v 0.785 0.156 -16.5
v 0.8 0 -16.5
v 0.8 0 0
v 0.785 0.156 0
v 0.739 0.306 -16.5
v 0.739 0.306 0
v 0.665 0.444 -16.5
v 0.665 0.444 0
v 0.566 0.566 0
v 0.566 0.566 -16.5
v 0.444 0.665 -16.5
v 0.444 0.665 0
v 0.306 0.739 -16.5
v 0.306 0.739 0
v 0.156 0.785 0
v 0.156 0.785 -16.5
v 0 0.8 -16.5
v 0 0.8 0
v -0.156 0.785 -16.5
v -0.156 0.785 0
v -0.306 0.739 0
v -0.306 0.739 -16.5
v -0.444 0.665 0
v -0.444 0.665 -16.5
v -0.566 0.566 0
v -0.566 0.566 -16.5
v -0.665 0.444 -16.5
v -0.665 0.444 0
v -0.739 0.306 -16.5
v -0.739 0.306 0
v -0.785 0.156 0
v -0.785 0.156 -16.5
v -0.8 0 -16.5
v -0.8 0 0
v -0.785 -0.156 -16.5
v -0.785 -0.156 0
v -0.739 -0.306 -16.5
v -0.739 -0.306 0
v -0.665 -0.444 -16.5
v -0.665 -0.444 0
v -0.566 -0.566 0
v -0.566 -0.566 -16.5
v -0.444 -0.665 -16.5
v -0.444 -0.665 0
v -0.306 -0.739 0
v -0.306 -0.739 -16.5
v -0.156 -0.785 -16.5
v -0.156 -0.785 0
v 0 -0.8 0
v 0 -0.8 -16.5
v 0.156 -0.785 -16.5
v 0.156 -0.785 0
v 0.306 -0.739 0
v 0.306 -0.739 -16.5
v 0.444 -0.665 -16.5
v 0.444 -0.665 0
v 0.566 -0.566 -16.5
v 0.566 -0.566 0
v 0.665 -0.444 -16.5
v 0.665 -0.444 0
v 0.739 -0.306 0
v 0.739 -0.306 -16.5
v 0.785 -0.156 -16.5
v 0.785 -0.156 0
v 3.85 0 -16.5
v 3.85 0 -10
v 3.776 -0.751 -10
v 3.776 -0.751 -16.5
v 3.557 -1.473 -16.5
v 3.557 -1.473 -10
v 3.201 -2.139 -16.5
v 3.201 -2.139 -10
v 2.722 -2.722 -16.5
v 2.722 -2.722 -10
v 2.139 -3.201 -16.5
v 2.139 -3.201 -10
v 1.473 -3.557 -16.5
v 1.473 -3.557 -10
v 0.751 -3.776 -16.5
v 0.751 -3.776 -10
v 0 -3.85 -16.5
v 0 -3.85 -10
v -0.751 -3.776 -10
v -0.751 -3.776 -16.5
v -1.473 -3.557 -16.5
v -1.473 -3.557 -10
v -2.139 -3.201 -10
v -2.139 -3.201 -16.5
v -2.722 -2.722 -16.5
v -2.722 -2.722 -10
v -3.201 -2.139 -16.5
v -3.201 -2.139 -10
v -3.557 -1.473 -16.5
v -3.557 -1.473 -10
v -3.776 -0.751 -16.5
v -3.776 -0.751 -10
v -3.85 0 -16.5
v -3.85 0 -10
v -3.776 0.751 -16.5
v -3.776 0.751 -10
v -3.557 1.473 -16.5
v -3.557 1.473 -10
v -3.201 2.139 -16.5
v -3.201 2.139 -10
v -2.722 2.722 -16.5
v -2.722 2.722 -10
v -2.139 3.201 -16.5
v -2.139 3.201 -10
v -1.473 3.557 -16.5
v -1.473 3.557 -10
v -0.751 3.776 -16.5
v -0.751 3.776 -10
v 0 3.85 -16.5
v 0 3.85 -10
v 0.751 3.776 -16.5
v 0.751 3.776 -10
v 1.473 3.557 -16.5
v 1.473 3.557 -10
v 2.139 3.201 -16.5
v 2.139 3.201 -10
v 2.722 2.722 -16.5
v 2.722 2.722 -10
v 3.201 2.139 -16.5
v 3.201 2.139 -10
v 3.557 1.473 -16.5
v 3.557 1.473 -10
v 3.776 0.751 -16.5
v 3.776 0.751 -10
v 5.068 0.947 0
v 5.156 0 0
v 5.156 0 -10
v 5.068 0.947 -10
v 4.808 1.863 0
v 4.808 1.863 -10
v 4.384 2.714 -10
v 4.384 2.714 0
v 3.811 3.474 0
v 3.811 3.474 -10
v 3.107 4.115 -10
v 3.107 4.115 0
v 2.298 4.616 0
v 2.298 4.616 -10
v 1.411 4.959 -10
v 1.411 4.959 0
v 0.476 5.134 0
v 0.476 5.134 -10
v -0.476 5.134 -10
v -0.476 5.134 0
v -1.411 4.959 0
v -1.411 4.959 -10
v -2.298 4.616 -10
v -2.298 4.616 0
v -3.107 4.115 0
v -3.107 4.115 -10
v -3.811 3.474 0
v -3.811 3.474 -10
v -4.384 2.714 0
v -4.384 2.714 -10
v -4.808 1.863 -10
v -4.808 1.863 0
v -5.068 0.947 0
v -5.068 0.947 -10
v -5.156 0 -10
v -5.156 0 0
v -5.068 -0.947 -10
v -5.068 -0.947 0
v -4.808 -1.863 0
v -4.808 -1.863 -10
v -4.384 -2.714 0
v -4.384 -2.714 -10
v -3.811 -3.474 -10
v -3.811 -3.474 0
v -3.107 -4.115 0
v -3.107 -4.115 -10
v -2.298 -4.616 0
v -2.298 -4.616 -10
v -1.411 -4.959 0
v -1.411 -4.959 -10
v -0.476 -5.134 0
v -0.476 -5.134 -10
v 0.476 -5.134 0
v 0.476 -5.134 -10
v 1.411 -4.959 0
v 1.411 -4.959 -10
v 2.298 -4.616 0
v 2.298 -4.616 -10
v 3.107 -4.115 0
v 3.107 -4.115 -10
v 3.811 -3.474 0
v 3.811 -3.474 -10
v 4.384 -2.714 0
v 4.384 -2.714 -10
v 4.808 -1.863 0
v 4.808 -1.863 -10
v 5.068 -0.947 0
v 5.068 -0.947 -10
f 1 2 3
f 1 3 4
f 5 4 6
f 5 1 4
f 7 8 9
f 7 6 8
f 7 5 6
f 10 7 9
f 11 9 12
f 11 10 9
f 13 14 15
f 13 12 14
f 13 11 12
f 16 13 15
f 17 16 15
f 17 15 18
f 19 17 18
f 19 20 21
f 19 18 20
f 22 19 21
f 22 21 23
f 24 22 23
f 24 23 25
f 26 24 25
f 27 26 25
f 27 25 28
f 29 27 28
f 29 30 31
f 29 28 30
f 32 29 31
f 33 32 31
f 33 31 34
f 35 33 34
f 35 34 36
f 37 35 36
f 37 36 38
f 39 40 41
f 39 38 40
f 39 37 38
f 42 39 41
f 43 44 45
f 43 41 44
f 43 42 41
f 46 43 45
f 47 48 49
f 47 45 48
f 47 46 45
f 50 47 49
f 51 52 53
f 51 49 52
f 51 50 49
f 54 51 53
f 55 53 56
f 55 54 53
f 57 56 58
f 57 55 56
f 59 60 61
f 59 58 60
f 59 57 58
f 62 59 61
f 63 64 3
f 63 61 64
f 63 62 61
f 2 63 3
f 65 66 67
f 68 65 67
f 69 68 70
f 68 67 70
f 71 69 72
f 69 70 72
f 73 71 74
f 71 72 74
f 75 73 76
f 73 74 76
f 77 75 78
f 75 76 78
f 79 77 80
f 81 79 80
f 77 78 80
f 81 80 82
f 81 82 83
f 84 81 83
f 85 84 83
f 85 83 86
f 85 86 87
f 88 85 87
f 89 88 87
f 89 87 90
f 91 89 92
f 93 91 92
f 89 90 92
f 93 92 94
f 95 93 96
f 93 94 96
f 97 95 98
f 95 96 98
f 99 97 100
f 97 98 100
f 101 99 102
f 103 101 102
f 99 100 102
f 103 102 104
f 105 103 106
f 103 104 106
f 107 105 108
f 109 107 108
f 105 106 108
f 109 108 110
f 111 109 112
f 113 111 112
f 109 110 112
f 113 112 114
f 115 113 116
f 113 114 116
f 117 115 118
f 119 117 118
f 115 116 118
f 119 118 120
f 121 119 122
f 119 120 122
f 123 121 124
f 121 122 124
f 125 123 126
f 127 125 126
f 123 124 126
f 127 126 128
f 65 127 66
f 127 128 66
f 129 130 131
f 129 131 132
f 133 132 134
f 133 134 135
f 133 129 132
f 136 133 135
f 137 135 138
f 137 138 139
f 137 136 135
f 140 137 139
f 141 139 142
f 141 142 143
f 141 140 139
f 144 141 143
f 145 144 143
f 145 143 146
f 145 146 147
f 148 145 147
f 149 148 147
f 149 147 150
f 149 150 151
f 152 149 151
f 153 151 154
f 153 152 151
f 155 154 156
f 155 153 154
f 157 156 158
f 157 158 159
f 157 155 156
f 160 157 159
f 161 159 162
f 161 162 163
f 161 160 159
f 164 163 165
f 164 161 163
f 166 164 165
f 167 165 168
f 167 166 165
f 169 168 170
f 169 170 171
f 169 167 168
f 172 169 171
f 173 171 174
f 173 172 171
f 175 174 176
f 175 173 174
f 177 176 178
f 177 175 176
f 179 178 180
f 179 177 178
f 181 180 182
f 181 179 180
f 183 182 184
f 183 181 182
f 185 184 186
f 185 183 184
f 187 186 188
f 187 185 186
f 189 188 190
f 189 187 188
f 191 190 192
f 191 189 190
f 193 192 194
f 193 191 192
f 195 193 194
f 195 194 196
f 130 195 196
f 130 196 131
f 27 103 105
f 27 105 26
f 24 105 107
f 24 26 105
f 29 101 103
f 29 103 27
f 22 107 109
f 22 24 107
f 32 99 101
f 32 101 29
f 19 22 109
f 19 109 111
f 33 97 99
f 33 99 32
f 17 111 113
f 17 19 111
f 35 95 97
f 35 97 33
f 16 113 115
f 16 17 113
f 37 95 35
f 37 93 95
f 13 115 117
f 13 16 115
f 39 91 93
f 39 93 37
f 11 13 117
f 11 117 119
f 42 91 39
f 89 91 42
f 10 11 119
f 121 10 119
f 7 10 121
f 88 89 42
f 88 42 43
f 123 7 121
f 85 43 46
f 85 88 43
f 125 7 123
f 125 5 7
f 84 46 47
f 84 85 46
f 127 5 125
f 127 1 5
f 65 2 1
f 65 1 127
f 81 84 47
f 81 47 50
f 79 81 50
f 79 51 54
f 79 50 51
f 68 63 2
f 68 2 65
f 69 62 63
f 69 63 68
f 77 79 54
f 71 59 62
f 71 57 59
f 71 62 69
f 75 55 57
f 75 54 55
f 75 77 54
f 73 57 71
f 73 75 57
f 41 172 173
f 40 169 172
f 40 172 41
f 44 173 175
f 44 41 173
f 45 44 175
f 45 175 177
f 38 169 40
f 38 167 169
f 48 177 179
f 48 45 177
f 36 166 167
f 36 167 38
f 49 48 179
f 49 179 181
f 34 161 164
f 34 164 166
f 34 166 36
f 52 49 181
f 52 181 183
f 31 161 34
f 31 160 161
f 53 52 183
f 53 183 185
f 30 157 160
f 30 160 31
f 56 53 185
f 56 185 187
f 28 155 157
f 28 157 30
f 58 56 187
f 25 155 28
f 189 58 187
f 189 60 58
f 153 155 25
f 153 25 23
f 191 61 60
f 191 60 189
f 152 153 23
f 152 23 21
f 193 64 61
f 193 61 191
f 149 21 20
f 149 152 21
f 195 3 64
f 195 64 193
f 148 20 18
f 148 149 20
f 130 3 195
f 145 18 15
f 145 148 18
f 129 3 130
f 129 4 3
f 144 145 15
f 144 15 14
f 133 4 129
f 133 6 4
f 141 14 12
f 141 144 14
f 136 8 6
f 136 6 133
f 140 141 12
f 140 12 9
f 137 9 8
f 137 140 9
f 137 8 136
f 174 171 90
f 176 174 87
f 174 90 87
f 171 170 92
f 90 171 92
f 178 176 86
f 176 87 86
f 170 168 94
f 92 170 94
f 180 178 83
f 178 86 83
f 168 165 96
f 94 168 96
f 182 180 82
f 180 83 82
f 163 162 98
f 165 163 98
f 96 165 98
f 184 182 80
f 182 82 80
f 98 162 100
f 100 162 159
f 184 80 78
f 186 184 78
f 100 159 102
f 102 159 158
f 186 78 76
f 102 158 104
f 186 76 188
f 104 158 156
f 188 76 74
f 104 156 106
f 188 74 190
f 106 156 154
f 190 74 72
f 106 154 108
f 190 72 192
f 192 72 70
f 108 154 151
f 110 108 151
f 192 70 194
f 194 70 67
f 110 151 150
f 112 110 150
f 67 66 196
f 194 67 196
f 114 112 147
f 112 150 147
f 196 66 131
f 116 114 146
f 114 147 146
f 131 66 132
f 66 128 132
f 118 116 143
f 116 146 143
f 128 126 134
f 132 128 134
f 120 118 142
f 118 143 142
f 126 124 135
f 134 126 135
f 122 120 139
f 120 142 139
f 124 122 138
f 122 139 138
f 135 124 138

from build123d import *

# Parameters (mm, degrees)
SKETCH2_R               = 5.156250121
BOSS_EXTRUDE1_DEPTH     = 10
SKETCH3_R               = 3.85
BOSS_EXTRUDE2_DEPTH     = 6.5
CUT_EXTRUDE1_DEPTH      = 19.039507494
CUT_EXTRUDE1_DEPTH_BACK = 19.039507494
SKETCH5_R               = 0.8


with BuildPart() as part:
    # Sketch2 → Boss-Extrude1 (new body)
    with BuildSketch(Plane.XY):
        Circle(SKETCH2_R)
    extrude(amount=-BOSS_EXTRUDE1_DEPTH)

    # Sketch3 → Boss-Extrude2 (add)
    with BuildSketch(Plane(origin=(0, 0, -10), x_dir=(-1, 0, 0), z_dir=(0, 0, -1))):
        with Locations(Location((0, 0, 0), (0, 0, 180))):
            Circle(SKETCH3_R)
    extrude(amount=BOSS_EXTRUDE2_DEPTH)

    # Sketch5 → Cut-Extrude1 (cut, two sides: drawn at the far end of the back side and taken through both)
    with BuildSketch(Plane.XY.offset(-CUT_EXTRUDE1_DEPTH_BACK)):
        Circle(SKETCH5_R)
    extrude(amount=CUT_EXTRUDE1_DEPTH + CUT_EXTRUDE1_DEPTH_BACK, mode=Mode.SUBTRACT)


solid = part.part
